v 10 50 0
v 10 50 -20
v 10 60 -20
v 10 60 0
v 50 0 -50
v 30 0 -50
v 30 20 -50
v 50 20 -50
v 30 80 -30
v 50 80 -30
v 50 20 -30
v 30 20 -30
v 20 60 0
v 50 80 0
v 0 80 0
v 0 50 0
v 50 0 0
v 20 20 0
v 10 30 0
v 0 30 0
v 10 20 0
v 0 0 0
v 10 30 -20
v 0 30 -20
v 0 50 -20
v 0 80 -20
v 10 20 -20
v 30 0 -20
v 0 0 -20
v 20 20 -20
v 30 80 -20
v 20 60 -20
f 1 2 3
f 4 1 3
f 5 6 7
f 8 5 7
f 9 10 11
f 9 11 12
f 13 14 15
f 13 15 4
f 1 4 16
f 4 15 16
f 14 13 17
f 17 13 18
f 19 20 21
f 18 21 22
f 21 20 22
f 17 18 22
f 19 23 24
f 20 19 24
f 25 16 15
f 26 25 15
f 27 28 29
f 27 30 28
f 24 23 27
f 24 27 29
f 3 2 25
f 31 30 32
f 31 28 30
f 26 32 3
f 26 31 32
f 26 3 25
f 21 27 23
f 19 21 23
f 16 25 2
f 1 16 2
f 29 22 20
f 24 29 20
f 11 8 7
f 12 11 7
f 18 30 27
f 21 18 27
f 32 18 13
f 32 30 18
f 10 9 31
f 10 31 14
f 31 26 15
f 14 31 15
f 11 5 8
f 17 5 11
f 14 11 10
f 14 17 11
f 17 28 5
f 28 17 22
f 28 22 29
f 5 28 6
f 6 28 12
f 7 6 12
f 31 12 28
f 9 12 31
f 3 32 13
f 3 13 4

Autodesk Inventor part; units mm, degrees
ref_plane "YZ Plane" through (0, 0, 0) normal (1, 0, 0) x (0, 1, 0)
ref_plane "XZ Plane" through (0, 0, 0) normal (0, 1, 0) x (-1, 0, 0)
ref_plane "XY Plane" through (0, 0, 0) normal (0, 0, 1) x (1, 0, 0)
sketch "Náčrt1" plane through (0, 0, 0) normal (1, 0, 0) x (0, 1, 0)
  line L0 (0, 0) -> (0, -50)
  line L1 (0, -50) -> (80, -50)
  line L2 (80, -50) -> (80, 0)
  line L3 (80, 0) -> (0, 0)
  dimension "d0" = 50
  dimension "d1" = 80
extrude "Vysunutí1" add sketch "Náčrt1" along normal blind 50
sketch "Náčrt2" plane through (0, 0, -50) normal (0, 0, -1) x (-1, 0, 0)
  line L0 (-50, 0) -> (-50, 80) projected
  line L1 (-50, 0) -> (-50, 20)
  line L2 (-50, 20) -> (-30, 20)
  line L3 (-30, 20) -> (-30, 0)
  line L4 (0, 0) -> (-50, 0) projected
  line L5 (-30, 0) -> (-50, 0)
  line L6 (-50, 0) -> (-50, 80)
  line L7 (-50, 80) -> (-30, 80)
  line L8 (0, 80) -> (-50, 80) projected
  line L9 (-30, 80) -> (-30, 20)
  dimension "d4" = 20
  dimension "d5" = 20
  dimension "d6" = 20
extrude "Vysunutí2" cut sketch "Náčrt2" against normal blind 20 contours L0 L7 L9 L2
sketch "Náčrt3" plane through (0, 0, -50) normal (0, 0, -1) x (-1, 0, 0)
  line L0 (0, 80) -> (-50, 80) projected
  line L1 (0, 0) -> (0, 80) projected
  line L2 (0, 80) -> (0, 0)
  line L3 (0, 0) -> (-30, 0)
  line L4 (0, 0) -> (-50, 0) projected
  line L5 (-30, 0) -> (-30, 80)
  dimension "d9" = 30
extrude "Vysunutí3" cut sketch "Náčrt3" against normal blind 30
sketch "Náčrt4" plane through (0, 0, -20) normal (0, 0, -1) x (-1, 0, 0)
  line L0 (0, 80) -> (0, 0) projected
  line L1 (0, 40) -> (0, 30)
  line L2 (0, 30) -> (0, 50)
  line L3 (0, 50) -> (-10, 50)
  line L4 (0, 40) -> (-20, 40)
  line L5 (-20, 40) -> (-20, 60)
  line L6 (-20, 60) -> (-10, 60)
  line L7 (-10, 50) -> (-10, 60)
  line L8 (0, 30) -> (-10, 30)
  dimension "d12" = 10
  dimension "d13" = 20
  dimension "d14" = 10
  dimension "d15" = 20
  dimension "d16" = 20
  dimension "d17" = 10
extrude "Vysunutí4" cut sketch "Náčrt4" against normal blind 30
sketch "Náčrt5" plane through (0, 0, -20) normal (0, 0, -1) x (-1, 0, 0)
  line L0 (0, 40) -> (0, 0) projected
  line L1 (-20, 40) -> (-20, 60) projected
  line L2 (0, 40) -> (-20, 40)
  line L3 (-20, 40) -> (-20, 20)
  line L4 (-20, 20) -> (-10, 20)
  line L5 (-10, 20) -> (-10, 30)
  line L6 (-10, 30) -> (0, 30)
  line L7 (0, 40) -> (0, 0) projected
  line L8 (0, 30) -> (0, 40)
  dimension "d20" = 20
  dimension "d21" = 10
  dimension "d22" = 10
extrude "Vysunutí5" cut sketch "Náčrt5" against normal blind 30
properties part number "Martin-Probst-26673_obrazek_2"
